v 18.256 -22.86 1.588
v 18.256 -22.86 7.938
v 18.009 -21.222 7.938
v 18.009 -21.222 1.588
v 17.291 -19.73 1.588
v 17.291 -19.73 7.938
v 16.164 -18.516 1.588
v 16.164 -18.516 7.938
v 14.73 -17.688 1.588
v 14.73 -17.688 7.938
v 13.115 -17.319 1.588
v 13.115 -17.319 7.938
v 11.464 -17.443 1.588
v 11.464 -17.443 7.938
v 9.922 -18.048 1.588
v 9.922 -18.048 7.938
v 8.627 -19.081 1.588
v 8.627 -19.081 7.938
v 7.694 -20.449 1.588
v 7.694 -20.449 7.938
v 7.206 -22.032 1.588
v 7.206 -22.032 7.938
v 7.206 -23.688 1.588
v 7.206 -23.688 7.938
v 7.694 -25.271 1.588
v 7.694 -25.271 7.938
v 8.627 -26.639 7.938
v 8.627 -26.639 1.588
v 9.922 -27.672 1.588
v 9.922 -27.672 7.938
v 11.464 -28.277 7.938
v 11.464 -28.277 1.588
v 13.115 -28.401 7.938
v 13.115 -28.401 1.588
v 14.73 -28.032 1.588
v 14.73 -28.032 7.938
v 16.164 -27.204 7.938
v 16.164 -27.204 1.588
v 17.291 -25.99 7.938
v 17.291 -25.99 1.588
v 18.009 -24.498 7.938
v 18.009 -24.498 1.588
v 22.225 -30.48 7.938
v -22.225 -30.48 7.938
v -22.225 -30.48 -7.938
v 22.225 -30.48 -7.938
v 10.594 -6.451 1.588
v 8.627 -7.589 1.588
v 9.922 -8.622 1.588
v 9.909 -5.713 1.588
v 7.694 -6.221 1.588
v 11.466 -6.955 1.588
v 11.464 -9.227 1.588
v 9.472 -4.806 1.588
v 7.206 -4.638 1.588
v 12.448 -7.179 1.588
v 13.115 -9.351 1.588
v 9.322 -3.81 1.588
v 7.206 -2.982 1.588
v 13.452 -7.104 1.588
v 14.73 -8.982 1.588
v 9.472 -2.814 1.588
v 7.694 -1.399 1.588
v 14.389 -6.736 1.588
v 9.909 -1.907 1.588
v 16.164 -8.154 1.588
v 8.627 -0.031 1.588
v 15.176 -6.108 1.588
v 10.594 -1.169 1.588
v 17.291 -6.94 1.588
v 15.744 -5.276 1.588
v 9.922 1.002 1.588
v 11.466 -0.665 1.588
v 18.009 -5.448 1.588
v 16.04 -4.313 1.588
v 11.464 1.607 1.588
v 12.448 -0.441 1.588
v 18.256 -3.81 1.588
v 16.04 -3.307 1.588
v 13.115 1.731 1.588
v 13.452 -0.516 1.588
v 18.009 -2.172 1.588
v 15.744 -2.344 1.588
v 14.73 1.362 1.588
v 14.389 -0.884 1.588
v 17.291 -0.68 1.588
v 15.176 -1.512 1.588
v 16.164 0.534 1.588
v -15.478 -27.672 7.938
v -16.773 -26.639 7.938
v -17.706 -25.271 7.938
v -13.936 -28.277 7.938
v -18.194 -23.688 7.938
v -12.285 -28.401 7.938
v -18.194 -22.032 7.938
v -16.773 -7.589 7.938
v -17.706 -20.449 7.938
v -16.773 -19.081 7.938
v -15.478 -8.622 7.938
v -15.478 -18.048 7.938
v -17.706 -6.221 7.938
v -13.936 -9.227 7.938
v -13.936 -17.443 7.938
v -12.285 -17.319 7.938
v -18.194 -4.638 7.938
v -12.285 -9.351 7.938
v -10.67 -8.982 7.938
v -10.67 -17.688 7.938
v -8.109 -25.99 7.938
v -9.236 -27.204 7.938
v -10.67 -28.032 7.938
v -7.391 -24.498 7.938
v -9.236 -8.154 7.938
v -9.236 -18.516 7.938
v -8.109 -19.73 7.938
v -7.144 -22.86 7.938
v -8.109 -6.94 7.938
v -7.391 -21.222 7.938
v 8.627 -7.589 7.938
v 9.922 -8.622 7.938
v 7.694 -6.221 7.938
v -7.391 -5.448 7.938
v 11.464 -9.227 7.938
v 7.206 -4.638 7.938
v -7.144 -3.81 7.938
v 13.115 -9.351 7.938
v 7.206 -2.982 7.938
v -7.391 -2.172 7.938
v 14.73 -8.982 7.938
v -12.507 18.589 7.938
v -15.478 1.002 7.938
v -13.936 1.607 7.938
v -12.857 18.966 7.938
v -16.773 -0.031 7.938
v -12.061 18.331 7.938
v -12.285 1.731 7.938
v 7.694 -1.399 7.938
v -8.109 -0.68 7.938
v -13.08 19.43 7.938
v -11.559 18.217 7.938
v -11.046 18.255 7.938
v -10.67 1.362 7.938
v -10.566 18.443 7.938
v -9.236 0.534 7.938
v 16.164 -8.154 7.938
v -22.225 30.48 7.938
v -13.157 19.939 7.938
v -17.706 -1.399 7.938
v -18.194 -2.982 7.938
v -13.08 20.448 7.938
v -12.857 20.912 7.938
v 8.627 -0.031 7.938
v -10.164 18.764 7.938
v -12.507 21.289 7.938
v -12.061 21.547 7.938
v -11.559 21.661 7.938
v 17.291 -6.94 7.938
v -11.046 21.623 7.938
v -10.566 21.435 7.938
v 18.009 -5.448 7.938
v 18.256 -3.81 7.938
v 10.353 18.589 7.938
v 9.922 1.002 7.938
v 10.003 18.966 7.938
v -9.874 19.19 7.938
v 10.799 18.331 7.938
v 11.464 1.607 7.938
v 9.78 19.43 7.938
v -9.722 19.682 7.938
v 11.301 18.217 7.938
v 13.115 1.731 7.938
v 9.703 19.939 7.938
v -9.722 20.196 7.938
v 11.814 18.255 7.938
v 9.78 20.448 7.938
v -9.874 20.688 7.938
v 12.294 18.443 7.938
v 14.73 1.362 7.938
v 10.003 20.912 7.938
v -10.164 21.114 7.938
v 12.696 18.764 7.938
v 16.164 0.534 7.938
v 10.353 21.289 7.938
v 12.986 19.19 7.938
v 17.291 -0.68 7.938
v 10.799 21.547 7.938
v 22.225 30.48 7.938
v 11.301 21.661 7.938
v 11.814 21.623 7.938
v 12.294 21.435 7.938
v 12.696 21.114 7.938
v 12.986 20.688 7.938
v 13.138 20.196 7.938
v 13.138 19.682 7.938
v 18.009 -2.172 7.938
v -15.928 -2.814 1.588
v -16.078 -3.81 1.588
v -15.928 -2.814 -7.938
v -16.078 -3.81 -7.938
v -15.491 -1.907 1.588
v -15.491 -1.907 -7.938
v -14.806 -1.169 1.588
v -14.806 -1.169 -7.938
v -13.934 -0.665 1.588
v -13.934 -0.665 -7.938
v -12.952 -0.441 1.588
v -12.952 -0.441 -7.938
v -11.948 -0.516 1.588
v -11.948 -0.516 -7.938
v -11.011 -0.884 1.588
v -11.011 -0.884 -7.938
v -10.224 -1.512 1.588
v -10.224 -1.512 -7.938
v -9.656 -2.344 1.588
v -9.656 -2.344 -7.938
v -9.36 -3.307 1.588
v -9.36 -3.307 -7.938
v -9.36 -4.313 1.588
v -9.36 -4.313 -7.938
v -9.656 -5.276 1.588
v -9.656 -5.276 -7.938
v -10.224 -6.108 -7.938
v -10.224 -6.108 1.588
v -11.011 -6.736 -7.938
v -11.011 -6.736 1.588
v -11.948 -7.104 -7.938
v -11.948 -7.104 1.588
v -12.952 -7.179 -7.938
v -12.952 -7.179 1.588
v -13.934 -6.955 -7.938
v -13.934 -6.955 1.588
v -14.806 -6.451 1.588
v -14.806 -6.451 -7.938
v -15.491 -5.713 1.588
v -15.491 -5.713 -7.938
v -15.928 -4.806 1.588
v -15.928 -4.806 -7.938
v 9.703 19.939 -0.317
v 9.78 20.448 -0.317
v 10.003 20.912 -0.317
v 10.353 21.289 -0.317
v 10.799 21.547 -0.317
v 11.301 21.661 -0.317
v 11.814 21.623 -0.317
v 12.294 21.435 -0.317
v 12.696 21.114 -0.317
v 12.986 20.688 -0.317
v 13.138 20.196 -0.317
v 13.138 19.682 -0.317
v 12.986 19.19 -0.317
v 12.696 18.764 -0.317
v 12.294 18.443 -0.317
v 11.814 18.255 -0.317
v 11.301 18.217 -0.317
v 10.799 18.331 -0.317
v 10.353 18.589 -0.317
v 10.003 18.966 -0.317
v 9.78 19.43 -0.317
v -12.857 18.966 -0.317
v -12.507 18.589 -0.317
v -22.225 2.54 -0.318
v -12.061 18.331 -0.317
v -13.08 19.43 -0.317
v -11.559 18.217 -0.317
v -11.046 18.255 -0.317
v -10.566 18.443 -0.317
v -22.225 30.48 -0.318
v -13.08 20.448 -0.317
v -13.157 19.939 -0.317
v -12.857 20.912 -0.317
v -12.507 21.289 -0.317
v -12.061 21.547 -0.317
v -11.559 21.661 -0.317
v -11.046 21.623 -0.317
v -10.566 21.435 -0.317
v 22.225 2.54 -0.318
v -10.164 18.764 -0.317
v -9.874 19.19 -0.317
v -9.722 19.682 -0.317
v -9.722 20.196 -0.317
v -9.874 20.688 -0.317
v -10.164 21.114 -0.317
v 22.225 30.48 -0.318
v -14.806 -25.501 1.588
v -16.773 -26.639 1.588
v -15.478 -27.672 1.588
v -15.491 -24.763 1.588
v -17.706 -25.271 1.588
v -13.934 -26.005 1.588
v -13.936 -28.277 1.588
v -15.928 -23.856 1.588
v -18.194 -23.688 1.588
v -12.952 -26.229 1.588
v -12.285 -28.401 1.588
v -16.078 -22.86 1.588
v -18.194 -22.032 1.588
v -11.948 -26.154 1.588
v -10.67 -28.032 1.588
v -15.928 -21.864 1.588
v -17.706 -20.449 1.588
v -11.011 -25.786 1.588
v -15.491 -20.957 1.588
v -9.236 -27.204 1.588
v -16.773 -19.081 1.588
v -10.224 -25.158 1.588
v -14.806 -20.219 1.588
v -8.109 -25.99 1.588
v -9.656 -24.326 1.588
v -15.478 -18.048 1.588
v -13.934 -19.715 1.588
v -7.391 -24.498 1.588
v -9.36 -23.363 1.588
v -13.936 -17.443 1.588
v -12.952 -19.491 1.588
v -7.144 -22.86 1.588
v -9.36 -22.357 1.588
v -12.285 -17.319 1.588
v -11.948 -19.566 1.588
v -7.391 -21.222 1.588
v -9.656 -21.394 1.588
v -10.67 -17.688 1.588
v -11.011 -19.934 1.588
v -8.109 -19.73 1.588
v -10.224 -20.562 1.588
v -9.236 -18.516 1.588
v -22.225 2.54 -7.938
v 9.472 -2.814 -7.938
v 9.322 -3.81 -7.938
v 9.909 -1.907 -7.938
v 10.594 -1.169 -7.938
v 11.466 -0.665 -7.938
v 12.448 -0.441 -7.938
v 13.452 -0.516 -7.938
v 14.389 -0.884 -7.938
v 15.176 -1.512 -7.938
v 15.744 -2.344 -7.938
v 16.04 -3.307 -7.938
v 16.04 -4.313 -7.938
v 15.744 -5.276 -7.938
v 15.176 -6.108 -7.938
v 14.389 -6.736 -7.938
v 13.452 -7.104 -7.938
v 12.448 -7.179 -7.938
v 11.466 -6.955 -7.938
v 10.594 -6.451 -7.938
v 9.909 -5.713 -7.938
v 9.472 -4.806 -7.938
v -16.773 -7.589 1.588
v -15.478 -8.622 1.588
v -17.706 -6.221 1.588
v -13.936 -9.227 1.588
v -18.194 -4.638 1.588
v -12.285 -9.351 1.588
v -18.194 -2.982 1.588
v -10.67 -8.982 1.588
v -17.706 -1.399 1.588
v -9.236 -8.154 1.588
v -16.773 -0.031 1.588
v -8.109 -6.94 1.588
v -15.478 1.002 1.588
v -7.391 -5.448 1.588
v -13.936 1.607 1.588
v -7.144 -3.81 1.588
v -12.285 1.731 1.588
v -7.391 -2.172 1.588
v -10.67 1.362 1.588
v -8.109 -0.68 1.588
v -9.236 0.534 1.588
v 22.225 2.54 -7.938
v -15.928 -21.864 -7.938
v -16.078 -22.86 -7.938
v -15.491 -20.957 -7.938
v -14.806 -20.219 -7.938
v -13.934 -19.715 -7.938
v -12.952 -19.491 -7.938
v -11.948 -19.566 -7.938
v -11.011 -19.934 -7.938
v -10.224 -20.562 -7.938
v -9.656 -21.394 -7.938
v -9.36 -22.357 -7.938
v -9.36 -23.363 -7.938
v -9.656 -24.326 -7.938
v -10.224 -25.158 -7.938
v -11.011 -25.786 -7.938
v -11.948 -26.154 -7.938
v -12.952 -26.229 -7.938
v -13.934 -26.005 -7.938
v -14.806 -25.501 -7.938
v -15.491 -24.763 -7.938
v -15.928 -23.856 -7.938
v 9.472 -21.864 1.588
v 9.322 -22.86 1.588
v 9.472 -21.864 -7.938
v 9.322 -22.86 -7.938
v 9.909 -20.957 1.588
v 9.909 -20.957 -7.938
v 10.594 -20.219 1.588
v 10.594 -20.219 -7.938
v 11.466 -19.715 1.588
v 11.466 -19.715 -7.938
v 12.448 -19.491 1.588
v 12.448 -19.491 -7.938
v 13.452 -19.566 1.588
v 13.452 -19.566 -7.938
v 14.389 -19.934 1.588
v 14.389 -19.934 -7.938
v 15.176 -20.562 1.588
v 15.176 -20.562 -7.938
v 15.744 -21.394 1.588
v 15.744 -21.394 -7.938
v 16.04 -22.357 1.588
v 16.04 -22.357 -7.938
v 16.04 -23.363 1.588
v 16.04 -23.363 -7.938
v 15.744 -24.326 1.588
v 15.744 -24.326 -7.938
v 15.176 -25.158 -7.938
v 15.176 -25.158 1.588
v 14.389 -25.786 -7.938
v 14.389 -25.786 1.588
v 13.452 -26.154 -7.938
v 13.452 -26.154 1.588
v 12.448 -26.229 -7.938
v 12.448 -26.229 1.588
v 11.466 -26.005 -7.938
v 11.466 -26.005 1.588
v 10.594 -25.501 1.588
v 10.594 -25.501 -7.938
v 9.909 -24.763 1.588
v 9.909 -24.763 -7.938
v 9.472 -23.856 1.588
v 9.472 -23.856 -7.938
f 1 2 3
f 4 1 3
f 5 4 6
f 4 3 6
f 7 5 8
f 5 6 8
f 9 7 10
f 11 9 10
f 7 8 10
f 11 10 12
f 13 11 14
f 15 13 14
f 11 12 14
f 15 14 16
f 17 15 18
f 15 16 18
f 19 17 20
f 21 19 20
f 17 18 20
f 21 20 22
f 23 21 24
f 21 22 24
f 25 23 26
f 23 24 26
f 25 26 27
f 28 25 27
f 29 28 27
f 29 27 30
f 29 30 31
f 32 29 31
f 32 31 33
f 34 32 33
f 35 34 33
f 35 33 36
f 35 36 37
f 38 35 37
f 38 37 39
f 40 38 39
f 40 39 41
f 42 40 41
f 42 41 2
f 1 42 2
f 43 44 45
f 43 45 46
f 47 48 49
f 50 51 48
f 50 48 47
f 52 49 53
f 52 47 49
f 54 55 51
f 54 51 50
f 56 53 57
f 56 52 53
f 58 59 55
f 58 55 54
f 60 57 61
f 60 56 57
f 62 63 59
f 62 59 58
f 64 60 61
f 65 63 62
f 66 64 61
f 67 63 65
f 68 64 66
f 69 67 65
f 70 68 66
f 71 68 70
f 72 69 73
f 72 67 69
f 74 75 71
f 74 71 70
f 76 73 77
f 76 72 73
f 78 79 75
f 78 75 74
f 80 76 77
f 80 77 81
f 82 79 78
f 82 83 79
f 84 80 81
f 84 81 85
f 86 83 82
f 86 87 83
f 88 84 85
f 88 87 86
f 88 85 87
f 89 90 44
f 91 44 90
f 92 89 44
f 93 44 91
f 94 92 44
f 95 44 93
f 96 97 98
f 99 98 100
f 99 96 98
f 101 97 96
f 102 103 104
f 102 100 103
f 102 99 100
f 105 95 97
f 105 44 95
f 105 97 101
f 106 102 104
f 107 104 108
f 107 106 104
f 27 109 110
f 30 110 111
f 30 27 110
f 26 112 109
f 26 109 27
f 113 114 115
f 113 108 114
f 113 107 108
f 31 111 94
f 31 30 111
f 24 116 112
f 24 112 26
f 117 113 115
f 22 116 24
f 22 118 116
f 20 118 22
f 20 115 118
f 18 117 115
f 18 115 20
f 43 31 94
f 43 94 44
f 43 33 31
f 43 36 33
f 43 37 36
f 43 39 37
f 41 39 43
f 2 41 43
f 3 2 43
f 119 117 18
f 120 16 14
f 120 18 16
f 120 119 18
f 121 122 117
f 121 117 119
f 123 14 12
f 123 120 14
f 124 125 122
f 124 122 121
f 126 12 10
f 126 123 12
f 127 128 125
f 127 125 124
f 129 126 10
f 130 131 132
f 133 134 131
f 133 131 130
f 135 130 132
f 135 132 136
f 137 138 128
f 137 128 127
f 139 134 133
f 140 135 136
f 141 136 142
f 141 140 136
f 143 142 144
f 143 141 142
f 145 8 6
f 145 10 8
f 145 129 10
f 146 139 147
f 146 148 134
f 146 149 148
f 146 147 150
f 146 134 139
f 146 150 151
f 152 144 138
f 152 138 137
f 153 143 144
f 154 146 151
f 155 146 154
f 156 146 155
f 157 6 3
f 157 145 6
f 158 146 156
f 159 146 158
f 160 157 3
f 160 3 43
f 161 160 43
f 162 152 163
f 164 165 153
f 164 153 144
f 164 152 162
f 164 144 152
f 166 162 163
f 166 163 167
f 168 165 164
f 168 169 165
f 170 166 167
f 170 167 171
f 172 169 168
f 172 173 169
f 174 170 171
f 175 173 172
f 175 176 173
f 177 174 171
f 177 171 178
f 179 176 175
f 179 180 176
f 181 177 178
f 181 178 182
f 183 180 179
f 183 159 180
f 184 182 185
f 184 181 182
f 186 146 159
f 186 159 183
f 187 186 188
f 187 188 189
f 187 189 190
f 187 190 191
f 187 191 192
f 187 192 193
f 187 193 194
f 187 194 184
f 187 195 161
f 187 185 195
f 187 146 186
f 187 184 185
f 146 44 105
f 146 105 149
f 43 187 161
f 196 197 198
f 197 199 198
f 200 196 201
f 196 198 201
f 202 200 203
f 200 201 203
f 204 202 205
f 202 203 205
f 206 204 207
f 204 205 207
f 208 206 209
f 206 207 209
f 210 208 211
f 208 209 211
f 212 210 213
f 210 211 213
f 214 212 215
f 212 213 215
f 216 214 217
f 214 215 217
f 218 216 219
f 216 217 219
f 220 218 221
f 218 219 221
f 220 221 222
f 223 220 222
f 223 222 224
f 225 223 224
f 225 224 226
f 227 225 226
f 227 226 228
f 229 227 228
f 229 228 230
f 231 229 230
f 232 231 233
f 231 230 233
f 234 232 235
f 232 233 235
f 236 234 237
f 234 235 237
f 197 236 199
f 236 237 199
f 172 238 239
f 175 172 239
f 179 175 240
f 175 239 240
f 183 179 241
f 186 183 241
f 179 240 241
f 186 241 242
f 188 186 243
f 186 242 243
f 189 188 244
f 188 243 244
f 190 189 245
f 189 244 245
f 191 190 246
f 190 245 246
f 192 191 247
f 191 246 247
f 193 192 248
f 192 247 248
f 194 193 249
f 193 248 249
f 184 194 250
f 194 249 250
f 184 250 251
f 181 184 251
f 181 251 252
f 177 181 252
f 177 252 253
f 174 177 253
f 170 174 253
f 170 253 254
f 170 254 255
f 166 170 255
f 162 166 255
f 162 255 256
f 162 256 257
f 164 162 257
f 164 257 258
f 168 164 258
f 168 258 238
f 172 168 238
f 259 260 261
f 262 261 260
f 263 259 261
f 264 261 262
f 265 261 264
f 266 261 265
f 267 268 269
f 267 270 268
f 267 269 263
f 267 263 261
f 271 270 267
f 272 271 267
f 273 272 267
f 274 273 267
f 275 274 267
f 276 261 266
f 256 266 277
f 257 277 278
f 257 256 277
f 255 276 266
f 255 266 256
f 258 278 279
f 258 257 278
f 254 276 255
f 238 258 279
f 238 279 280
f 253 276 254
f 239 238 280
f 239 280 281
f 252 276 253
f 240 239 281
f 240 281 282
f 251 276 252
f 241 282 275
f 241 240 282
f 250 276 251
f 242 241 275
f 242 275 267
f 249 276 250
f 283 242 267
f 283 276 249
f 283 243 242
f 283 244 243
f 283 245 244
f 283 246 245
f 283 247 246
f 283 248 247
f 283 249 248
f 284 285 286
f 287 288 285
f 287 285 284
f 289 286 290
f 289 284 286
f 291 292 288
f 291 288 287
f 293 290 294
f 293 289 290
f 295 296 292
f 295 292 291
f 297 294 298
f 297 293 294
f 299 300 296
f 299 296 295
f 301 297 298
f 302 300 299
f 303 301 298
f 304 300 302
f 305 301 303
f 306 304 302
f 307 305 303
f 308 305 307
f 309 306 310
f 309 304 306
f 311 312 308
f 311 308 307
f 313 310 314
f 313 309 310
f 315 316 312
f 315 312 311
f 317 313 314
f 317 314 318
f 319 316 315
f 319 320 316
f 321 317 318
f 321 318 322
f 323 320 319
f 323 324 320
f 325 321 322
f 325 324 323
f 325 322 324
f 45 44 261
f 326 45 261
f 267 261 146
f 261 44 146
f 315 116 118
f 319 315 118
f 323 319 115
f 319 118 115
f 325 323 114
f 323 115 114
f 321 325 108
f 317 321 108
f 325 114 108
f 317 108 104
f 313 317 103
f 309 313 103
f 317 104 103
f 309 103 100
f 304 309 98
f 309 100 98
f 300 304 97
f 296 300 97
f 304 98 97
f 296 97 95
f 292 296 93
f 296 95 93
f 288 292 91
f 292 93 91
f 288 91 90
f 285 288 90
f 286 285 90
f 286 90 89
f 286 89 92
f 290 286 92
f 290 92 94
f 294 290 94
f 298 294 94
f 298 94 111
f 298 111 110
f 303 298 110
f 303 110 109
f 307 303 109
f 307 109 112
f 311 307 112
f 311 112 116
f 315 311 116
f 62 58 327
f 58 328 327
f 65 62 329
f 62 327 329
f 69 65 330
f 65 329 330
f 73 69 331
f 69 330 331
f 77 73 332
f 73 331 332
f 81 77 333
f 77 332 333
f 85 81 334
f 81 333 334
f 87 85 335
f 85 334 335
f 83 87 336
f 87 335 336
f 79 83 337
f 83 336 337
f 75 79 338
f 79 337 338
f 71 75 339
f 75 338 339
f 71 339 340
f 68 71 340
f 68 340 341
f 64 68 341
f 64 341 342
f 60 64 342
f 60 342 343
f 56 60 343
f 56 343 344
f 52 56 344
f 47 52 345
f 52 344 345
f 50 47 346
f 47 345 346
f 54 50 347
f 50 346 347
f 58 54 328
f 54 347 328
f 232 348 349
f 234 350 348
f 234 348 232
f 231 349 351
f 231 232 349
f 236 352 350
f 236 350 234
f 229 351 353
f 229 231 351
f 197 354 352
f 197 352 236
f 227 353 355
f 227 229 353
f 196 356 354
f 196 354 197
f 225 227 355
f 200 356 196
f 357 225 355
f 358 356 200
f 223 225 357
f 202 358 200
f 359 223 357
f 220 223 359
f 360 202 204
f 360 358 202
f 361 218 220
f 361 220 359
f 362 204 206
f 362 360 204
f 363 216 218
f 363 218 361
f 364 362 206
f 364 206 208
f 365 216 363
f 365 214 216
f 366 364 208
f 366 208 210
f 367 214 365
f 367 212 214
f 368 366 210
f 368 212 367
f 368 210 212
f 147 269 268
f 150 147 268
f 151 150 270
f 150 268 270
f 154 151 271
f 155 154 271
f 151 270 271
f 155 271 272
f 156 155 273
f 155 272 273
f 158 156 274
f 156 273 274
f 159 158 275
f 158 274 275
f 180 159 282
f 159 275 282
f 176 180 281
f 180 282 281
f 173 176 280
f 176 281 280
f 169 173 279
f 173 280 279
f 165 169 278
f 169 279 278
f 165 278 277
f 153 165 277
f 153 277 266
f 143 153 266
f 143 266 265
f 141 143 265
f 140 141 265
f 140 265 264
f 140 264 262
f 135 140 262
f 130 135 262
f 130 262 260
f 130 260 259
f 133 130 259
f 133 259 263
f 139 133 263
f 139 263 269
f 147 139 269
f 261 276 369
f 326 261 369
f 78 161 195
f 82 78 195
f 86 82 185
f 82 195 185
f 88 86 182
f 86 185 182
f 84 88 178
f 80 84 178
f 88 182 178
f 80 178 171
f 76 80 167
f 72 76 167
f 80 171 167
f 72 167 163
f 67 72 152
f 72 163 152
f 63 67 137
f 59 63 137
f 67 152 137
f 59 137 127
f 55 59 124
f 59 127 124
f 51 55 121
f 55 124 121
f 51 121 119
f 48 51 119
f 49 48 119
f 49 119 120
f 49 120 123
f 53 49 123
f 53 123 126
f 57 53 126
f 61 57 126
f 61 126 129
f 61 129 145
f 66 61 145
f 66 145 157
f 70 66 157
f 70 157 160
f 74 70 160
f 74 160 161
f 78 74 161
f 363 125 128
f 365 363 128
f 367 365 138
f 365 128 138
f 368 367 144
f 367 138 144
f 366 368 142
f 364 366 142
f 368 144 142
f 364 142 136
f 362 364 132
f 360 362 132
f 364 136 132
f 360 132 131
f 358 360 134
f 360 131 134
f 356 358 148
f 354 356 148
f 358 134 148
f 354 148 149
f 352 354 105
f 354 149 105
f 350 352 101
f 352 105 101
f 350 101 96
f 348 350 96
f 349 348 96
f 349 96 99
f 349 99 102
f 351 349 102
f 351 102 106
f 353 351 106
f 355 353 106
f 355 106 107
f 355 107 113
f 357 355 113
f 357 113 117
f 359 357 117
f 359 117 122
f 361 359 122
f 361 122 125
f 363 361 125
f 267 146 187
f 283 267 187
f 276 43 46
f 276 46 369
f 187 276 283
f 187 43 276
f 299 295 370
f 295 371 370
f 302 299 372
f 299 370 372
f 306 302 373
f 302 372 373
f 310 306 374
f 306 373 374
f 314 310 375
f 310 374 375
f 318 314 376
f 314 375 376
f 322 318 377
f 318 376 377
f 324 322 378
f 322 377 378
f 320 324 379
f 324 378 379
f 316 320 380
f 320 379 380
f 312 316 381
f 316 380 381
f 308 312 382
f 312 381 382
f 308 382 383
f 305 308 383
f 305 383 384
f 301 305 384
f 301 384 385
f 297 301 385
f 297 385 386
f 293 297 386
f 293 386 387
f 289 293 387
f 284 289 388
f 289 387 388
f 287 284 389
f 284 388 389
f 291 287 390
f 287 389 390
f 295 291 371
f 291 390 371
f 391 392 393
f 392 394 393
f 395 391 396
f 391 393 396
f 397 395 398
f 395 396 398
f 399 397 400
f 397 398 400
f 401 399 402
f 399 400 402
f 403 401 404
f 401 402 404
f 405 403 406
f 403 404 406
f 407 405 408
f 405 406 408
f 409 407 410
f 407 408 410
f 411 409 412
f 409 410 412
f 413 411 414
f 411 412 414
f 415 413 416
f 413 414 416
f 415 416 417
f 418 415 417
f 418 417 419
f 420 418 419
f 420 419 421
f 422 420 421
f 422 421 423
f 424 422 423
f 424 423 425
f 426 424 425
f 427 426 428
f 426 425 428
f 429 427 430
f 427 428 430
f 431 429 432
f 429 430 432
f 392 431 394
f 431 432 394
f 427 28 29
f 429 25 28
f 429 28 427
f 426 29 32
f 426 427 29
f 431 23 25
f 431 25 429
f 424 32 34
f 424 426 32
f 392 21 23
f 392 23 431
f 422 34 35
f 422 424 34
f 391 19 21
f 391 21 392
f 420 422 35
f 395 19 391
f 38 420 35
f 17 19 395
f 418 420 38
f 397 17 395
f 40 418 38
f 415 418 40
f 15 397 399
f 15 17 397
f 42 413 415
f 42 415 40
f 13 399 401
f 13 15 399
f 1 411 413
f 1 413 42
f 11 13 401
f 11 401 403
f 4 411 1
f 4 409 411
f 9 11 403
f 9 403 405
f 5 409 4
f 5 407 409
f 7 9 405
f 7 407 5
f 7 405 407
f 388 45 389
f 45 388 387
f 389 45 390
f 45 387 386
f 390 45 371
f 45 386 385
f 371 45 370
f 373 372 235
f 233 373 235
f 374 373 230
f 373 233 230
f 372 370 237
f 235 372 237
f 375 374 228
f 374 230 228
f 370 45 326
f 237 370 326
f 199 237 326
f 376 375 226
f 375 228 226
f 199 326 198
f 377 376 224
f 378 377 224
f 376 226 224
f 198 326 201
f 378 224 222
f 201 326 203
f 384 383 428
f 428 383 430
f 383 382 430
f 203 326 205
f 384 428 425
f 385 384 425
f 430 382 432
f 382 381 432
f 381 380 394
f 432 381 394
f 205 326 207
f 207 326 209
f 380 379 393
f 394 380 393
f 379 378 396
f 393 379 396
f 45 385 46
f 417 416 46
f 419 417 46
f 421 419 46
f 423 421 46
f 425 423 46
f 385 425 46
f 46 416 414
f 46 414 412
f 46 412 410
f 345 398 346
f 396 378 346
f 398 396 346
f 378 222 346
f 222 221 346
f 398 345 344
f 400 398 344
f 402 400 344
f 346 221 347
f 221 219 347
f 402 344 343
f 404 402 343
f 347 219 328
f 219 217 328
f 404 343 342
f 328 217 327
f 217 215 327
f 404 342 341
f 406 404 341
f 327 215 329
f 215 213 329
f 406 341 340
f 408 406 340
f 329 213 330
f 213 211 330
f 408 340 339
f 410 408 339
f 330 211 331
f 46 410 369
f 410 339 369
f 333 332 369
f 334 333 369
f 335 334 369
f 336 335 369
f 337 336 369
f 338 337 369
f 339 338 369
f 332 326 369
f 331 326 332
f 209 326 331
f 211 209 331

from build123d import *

# Parameters (mm, degrees)
SKETCH1_W                                        = 44.45
SKETCH1_H                                        = 60.96
BOSS_EXTRUDE1_DEPTH                              = 7.9375
CBORE_FOR_1_4_SOCKET_HEAD_CAP_SCREW1_D           = 6.7564
CBORE_FOR_1_4_SOCKET_HEAD_CAP_SCREW1_CBORE_D     = 11.1125
CBORE_FOR_1_4_SOCKET_HEAD_CAP_SCREW1_CBORE_DEPTH = 6.35
SKETCH4_W                                        = 7.62
SKETCH4_H                                        = 27.94
CUT_EXTRUDE1_DEPTH                               = 45.45
F_8_32_TAPPED_HOLE1_D                            = 3.4544


with BuildPart() as part:
    # Sketch1 → Boss-Extrude1 (new body, symmetric)
    with BuildSketch(Plane.XY):
        Rectangle(SKETCH1_W, SKETCH1_H)
    extrude(amount=BOSS_EXTRUDE1_DEPTH, both=True)

    # CBORE for 1/4 Socket Head Cap Screw1 (through all)
    with Locations(Plane.XY.offset(7.9375)):
        with Locations((-12.7, -3.81), (12.7, -3.81), (12.7, -22.86), (-12.7, -22.86)):
            CounterBoreHole(CBORE_FOR_1_4_SOCKET_HEAD_CAP_SCREW1_D / 2, CBORE_FOR_1_4_SOCKET_HEAD_CAP_SCREW1_CBORE_D / 2, CBORE_FOR_1_4_SOCKET_HEAD_CAP_SCREW1_CBORE_DEPTH)

    # Sketch4 → Cut-Extrude1 (cut, through all)
    with BuildSketch(Plane(origin=(22.225, 0, 0), x_dir=(0, 0, -1), z_dir=(1, 0, 0))):
        with Locations((4.1275, 16.51)):
            Rectangle(SKETCH4_W, SKETCH4_H)
    extrude(amount=-CUT_EXTRUDE1_DEPTH, mode=Mode.SUBTRACT)

    # #8-32 Tapped Hole1 (through all)
    with Locations(Plane.XY.offset(7.9375)):
        with Locations((-11.43, 19.939), (11.43, 19.939)):
            Hole(F_8_32_TAPPED_HOLE1_D / 2)


solid = part.part
